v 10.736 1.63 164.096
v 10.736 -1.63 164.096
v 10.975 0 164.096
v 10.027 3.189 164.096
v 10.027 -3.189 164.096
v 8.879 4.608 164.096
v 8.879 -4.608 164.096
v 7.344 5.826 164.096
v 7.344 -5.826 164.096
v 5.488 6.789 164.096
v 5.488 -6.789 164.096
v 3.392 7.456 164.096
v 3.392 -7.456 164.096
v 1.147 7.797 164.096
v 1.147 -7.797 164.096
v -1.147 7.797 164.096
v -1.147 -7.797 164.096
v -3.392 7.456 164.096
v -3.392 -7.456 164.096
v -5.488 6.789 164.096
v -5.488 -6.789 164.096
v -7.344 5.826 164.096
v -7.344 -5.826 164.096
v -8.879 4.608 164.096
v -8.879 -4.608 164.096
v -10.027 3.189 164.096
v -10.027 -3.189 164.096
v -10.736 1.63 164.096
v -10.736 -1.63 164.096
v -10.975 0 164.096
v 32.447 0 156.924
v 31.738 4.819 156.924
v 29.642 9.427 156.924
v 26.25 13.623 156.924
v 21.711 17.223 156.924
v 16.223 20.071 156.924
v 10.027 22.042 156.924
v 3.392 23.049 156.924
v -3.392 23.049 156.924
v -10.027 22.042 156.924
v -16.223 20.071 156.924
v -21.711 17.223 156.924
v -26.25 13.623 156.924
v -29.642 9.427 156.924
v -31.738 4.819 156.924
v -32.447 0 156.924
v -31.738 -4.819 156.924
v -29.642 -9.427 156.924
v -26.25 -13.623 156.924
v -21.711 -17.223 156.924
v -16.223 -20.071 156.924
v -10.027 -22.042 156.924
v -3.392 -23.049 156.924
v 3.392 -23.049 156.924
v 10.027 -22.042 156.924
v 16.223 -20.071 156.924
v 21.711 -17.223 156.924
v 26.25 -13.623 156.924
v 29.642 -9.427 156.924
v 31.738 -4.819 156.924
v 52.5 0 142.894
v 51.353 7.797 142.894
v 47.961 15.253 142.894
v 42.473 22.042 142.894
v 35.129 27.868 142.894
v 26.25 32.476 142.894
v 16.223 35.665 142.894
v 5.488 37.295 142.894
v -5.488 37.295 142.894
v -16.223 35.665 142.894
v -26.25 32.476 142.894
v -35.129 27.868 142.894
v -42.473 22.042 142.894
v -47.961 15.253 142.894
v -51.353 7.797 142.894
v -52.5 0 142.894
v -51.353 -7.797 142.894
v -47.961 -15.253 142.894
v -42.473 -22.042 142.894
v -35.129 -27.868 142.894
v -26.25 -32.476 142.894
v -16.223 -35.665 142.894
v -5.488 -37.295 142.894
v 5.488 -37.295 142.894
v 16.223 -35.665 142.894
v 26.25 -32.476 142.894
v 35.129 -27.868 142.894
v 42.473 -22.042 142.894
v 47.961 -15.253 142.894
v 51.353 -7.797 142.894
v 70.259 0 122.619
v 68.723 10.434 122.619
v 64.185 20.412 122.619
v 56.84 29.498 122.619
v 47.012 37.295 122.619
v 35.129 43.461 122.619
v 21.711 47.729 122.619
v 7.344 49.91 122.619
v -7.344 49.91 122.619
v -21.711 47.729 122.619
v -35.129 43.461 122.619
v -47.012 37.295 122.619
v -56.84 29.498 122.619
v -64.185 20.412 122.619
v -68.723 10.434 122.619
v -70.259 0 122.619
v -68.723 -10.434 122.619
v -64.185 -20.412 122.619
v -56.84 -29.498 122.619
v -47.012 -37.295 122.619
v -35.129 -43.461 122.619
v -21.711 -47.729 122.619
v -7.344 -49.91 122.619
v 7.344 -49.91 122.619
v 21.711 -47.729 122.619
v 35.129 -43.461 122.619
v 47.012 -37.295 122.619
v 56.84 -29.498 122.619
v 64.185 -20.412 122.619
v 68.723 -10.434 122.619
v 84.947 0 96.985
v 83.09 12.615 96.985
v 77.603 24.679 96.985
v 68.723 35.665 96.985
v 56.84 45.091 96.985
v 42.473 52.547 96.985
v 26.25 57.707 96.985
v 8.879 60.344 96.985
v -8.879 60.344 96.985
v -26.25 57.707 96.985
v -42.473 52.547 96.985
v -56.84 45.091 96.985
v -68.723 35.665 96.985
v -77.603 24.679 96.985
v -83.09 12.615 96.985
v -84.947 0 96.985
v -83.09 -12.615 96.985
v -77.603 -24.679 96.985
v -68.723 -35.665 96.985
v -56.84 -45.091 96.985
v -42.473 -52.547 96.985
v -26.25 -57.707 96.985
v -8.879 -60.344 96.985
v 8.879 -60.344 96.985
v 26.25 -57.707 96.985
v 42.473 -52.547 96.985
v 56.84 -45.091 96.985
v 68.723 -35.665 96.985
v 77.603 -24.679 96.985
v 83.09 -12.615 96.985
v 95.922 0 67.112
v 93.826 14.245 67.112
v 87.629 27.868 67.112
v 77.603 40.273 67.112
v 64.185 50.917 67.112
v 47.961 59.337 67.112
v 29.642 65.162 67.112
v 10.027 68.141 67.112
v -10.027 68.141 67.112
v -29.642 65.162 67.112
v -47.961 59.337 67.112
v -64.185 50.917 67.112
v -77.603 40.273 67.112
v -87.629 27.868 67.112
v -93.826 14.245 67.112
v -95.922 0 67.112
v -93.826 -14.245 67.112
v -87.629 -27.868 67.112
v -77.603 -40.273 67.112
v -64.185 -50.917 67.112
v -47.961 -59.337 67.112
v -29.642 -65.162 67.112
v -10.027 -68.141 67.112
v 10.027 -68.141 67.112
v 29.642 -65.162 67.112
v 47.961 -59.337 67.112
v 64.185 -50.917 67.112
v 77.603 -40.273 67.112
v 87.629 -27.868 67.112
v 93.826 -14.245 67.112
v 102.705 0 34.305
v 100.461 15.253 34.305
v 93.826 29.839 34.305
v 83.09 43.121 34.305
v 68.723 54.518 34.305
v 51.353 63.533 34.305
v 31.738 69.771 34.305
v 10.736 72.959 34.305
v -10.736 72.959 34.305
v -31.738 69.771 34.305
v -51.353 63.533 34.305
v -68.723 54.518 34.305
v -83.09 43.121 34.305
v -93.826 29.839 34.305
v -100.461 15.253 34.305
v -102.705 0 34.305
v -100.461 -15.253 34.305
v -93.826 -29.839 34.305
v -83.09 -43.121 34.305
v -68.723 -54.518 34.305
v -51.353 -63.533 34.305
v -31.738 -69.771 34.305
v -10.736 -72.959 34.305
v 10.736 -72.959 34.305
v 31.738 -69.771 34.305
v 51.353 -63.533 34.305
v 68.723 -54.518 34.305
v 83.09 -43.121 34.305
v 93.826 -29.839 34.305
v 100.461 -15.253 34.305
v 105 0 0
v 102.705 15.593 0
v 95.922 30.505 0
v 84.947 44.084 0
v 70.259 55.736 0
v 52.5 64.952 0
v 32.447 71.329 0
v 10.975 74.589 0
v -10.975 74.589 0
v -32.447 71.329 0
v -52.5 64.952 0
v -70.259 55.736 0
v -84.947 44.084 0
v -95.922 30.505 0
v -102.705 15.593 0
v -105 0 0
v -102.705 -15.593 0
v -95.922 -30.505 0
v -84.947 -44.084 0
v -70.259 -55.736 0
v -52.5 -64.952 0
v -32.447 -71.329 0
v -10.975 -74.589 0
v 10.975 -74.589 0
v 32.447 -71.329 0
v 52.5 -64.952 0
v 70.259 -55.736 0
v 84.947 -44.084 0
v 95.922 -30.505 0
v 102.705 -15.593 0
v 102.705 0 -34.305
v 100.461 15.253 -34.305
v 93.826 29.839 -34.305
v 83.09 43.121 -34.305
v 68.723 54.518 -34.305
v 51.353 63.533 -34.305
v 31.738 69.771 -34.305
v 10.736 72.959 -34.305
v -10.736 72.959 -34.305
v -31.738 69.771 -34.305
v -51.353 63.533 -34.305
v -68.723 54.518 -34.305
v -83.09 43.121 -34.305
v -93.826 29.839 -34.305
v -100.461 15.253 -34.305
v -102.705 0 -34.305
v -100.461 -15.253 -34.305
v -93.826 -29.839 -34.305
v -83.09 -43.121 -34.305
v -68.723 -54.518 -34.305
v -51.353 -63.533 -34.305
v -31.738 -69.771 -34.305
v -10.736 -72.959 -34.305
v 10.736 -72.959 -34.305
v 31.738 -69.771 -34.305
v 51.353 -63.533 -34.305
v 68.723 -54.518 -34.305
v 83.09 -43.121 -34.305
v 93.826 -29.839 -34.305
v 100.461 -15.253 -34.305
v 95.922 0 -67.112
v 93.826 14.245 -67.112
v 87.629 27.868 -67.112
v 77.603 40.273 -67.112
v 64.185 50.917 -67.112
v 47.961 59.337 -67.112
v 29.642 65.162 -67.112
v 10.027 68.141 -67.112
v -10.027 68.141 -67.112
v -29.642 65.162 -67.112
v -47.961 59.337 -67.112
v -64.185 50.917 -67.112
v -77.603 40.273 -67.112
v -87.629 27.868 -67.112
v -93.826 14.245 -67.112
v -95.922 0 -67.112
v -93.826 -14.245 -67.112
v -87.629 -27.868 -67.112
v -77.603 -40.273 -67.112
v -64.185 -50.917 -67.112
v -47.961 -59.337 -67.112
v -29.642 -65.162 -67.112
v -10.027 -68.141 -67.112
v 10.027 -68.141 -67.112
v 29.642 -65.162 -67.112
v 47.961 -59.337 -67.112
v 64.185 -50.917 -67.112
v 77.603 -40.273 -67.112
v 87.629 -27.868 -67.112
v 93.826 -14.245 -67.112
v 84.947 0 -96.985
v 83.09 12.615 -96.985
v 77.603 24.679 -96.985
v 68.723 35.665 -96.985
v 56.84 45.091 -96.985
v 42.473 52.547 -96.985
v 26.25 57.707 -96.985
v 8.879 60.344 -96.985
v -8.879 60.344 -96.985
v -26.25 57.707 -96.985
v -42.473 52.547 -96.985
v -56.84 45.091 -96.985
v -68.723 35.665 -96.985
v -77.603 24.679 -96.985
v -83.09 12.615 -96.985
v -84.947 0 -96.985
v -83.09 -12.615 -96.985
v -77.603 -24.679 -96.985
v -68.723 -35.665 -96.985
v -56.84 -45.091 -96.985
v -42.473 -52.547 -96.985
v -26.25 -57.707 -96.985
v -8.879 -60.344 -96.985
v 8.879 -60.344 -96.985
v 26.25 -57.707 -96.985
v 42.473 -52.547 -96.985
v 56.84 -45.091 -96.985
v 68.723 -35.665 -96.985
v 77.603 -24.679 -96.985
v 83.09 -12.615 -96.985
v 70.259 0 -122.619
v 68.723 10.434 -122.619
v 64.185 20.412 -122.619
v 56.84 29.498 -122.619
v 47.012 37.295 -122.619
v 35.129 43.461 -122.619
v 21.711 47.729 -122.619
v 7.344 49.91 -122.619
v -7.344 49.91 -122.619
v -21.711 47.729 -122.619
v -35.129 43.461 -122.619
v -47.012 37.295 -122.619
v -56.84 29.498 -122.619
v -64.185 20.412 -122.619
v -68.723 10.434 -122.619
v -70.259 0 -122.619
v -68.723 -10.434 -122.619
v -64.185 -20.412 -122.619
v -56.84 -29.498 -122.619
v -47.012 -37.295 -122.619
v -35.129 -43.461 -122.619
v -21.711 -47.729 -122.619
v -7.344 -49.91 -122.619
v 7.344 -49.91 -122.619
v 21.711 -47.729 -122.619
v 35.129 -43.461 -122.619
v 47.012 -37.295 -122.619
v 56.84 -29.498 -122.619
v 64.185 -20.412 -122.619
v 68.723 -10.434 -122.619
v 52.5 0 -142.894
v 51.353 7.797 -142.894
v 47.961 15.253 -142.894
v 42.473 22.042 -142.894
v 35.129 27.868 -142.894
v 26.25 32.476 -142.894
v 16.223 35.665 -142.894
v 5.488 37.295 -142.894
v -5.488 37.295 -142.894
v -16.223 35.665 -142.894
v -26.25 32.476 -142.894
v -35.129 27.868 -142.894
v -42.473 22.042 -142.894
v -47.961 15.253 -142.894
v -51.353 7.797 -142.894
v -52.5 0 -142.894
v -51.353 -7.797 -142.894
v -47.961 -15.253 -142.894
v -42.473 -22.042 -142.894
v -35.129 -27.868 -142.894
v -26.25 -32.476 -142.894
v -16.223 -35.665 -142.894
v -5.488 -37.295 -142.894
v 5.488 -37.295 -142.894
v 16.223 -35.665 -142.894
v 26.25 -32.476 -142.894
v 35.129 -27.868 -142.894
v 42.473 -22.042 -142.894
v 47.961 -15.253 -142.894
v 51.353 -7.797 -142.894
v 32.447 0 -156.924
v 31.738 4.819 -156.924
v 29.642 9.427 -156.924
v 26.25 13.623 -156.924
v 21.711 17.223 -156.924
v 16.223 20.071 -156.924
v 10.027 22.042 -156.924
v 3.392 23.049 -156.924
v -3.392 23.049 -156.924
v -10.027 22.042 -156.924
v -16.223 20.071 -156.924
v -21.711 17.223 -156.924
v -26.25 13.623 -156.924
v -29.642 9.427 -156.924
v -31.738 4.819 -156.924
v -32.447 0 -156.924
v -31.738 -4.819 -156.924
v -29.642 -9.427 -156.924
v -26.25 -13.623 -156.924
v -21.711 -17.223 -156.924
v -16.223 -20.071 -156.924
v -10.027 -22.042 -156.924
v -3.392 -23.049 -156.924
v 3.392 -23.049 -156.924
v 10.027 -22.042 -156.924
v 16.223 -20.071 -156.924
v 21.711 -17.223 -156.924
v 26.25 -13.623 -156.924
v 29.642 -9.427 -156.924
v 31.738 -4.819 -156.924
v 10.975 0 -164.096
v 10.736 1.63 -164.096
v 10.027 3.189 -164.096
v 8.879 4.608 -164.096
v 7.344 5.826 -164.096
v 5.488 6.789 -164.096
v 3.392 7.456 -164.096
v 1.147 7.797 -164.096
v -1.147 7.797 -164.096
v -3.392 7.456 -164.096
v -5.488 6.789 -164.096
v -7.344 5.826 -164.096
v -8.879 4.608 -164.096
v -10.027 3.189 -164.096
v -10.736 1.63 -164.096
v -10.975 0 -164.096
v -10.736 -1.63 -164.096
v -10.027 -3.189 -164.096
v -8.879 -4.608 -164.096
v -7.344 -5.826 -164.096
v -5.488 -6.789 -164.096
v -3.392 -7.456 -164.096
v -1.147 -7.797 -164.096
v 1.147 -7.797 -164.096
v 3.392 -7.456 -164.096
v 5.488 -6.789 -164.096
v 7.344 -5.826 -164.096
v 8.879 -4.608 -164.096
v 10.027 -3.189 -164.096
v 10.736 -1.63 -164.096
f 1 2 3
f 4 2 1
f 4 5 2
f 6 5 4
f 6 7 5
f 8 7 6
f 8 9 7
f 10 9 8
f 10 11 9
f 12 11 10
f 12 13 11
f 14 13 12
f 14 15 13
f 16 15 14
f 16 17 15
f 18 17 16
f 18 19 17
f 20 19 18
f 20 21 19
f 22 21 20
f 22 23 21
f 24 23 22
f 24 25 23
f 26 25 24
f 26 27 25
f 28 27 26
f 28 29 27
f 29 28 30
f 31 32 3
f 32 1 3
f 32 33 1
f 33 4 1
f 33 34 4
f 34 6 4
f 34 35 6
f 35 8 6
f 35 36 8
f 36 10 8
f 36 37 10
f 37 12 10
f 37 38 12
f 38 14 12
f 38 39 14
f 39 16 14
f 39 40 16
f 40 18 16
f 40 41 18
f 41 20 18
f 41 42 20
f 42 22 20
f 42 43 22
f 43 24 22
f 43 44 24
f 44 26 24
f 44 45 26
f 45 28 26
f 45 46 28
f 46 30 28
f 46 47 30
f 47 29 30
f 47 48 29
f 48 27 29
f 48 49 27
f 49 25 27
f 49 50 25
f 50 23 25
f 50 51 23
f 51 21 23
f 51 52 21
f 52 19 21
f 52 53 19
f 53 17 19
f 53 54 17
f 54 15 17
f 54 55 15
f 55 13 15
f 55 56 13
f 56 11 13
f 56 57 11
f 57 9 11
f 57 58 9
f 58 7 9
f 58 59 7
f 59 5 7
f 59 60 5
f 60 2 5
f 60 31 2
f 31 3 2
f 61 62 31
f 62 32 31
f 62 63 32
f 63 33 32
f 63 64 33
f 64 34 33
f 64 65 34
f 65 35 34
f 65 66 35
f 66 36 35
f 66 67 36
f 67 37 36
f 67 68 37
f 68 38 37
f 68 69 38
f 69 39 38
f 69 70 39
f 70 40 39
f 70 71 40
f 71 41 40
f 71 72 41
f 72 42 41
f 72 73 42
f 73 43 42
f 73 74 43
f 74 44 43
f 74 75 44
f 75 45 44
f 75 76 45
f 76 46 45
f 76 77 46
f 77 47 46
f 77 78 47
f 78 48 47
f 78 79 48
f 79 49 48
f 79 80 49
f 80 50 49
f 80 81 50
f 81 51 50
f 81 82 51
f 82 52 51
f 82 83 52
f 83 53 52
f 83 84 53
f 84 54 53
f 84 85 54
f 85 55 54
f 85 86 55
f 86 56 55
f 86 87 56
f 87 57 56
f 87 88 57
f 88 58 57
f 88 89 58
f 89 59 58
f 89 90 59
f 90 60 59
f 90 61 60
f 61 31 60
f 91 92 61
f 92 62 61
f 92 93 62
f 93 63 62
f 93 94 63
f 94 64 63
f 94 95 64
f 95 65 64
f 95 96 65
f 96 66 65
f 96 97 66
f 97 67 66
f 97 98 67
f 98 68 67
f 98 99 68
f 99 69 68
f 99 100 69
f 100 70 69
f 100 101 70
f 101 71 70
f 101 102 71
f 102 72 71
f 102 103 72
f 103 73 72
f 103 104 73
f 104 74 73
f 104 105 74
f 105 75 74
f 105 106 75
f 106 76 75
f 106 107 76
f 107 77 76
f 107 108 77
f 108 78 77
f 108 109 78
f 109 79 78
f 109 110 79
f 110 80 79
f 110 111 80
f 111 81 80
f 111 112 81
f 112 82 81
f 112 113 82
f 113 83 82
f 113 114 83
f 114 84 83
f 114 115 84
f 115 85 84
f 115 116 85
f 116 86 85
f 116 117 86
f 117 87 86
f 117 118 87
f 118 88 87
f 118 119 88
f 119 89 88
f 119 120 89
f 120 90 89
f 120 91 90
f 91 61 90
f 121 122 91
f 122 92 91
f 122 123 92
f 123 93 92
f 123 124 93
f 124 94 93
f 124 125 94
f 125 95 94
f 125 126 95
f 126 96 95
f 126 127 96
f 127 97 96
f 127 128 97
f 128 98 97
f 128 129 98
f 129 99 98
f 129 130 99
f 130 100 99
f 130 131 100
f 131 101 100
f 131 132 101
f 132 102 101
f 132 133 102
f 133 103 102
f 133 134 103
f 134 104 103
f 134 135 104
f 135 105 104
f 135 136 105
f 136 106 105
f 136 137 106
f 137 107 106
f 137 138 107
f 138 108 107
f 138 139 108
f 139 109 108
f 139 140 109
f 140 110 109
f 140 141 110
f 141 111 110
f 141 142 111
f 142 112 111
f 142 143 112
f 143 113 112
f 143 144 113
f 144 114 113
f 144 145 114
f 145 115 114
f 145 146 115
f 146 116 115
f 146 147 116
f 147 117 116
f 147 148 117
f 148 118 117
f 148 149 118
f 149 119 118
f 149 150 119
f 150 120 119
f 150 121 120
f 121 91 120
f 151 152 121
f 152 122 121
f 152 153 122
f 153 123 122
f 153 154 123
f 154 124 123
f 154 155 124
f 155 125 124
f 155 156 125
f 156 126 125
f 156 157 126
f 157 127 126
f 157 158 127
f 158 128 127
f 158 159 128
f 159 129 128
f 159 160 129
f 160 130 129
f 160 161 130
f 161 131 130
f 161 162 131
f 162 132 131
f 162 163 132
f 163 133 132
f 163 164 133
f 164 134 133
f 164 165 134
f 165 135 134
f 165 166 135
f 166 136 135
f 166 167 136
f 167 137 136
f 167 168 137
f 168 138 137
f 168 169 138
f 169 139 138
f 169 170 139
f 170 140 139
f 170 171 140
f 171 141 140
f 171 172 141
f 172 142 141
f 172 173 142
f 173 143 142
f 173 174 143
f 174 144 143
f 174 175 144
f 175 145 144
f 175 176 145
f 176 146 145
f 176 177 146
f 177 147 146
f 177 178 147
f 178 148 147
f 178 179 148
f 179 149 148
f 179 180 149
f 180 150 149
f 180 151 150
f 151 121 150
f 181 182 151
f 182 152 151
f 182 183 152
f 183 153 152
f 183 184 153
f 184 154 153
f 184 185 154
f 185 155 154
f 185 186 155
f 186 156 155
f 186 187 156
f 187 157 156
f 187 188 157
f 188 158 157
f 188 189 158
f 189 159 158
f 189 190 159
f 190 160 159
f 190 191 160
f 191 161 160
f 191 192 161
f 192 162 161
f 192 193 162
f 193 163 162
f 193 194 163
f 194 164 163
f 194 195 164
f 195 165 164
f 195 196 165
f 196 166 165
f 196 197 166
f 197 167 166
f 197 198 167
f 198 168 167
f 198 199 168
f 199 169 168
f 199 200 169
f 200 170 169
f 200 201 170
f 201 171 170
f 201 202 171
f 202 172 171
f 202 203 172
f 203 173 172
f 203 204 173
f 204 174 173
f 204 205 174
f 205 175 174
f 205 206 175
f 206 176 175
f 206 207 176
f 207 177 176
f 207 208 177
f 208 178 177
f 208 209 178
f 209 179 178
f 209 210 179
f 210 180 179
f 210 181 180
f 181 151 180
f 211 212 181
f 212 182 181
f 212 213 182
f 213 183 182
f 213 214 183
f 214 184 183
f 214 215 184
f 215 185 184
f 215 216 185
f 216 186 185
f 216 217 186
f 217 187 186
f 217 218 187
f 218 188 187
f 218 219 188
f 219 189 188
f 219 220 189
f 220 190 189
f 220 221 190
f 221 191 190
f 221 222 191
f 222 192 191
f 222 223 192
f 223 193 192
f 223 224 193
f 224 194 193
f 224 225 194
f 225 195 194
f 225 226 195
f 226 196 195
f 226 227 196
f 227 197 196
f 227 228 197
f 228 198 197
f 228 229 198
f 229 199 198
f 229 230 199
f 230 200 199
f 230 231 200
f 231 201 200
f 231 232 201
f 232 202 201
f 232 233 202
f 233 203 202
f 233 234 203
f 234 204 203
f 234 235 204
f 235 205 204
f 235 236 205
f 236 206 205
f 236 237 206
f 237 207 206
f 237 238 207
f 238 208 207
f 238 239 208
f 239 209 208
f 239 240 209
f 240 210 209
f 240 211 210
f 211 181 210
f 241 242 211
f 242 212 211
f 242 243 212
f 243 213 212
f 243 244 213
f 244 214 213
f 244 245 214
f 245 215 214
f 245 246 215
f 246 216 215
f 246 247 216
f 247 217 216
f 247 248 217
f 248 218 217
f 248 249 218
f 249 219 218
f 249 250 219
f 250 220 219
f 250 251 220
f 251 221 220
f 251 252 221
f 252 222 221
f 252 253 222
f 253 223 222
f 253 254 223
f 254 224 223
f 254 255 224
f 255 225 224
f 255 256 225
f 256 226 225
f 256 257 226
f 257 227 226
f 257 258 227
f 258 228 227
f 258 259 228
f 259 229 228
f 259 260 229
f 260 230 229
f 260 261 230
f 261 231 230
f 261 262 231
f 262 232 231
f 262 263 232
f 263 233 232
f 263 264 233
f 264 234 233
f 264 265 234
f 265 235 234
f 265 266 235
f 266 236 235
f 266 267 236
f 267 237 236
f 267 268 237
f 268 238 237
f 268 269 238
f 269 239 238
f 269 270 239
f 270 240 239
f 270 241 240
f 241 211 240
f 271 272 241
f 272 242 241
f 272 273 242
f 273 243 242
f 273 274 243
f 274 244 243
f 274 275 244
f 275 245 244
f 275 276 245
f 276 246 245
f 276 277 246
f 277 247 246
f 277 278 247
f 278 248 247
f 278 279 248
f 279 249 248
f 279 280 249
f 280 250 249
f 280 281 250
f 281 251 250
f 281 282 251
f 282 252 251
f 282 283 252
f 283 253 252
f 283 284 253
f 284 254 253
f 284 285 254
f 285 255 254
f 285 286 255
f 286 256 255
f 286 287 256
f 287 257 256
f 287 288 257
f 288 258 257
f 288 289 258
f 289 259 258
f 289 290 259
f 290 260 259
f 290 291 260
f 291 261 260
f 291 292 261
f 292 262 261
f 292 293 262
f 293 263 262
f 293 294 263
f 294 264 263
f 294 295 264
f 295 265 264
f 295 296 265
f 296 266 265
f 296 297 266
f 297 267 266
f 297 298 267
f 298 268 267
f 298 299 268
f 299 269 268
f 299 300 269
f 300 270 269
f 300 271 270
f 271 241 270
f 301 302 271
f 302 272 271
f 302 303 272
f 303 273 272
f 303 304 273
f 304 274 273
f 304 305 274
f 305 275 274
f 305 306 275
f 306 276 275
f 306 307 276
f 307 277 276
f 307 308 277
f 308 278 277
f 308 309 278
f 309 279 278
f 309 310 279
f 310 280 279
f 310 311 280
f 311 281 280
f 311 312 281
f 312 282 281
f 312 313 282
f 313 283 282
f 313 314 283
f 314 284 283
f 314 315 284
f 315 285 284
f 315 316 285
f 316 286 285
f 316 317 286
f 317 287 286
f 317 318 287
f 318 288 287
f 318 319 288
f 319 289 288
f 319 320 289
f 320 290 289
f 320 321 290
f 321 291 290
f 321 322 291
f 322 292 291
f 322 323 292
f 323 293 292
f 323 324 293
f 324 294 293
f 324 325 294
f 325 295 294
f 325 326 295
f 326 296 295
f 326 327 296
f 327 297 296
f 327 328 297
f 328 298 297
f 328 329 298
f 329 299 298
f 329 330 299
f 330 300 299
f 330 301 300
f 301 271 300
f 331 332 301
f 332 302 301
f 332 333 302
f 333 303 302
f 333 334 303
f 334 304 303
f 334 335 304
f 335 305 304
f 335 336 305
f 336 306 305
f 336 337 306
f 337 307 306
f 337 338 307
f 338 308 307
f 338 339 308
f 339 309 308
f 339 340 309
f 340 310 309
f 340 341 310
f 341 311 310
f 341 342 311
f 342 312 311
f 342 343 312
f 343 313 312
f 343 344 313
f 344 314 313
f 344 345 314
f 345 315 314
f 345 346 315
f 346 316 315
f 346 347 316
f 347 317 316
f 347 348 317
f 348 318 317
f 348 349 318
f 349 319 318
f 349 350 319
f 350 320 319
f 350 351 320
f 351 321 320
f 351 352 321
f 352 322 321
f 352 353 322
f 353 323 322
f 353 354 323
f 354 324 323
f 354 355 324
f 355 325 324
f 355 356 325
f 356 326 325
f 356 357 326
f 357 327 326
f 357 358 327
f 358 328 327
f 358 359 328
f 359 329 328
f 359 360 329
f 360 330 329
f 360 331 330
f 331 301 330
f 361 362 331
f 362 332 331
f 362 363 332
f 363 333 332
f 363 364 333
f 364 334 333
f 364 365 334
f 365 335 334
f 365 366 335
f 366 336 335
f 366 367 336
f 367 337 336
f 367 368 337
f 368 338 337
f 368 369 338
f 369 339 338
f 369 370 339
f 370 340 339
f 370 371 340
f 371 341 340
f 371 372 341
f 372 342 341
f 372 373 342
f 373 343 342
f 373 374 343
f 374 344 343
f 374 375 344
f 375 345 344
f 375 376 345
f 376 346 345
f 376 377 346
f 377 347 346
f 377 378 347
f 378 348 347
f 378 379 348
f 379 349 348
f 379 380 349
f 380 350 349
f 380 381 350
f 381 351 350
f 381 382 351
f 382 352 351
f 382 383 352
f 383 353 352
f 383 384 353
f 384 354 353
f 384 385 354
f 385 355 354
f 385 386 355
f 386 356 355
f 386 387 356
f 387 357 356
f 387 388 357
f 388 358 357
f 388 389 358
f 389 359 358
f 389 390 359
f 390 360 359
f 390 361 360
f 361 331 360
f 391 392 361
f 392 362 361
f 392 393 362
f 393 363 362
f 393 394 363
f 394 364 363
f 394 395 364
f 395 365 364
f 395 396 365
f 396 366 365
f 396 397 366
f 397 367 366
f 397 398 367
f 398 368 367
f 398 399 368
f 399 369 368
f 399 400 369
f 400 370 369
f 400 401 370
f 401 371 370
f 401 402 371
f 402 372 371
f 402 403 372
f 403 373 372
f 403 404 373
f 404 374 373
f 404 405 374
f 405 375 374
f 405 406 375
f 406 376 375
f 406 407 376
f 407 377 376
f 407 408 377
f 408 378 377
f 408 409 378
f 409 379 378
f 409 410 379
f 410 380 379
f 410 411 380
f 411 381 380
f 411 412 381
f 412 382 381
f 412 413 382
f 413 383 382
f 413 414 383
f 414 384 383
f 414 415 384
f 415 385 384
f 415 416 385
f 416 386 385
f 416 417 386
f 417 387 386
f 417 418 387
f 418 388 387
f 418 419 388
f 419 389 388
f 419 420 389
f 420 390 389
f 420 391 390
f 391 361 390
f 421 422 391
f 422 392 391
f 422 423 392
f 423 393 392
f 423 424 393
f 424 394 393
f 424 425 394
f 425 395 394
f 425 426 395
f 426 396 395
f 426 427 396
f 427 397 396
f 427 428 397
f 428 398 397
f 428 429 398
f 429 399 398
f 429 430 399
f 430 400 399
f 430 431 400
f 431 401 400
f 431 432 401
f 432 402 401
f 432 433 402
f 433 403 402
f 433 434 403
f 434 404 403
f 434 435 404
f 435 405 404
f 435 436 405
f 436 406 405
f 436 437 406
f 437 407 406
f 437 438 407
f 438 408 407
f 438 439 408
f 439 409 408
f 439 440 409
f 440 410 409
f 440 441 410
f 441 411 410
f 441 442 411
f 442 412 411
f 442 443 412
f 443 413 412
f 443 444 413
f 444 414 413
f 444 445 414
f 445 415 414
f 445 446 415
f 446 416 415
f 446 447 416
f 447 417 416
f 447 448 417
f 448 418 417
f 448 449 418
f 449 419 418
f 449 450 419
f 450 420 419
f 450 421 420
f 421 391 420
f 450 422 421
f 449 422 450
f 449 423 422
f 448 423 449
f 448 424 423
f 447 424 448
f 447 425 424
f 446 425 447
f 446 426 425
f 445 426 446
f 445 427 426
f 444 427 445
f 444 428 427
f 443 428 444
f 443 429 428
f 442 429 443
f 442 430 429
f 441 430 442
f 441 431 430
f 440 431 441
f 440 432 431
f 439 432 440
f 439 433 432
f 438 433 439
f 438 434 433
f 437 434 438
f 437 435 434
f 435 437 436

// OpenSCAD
// Generated by SolidPython 1.0.1 on 2020-07-29 00:46:47


scale(v = [7, 5, 11]) {
	sphere(r = 15);
}
/***********************************************
*********      SolidPython code:      **********
************************************************
 
# import packages: SolidPython
from solid import *
from solid.utils import *
from itertools import chain, combinations, permutations


class Resize:

    def __init__(self, scad_file):
        self.scad_file = scad_file
        #self.scad_file = import_scad(scad_file)
        # cone/cylinder param:
        self.r1 = 0
        self.r2 = 0
        self.h = 0
        # rectangular prism param:
        self.w = 0
        self.l = 0
        # ellipse param:
        self.r = 0

    # import OpenScad code (file name corresponds to shape)


    # classify shape + parameters
    def assign(self, param1, param2, param3):
        if self.scad_file == 'cone.scad':
            self.r1 = param1
            self.r2 = param2
            self.h = param3
        elif self.scad_file == 'cylinder.scad':
            self.r1 = param1
            self.r2 = param2
            self.h = param3
        elif self.scad_file == 'rectangularPrism.scad':
            self.h = param1
            self.l = param2
            self.w = param3
        else:
            self.r = param1
            self.h = param2

    # resize parameters
    def iterate(self):
        x = range(3, 20, 2)
        i = 1
        if self.scad_file == 'cone.scad':
            tempList = list(permutations(x, 2))
            for temp in tempList:
                param1 = temp[0]
                param2 = temp[1]
                filepath = 'produced_scad_files/' + 'cone' + str(param1) + '_' + str(param2) + '_' + '.scad'
                scad_render_to_file(cylinder(h=param1, r1=param2, r2=0), filepath)

        elif self.scad_file == 'cylinder.scad':
            tempList = list(permutations(x, 3))
            for temp in tempList:
                param1 = temp[0]
                param2 = temp[1]
                filepath = 'produced_scad_files/' + 'cylinder' + str(param1) + '_' + str(param2) + '_' + '.scad'
                scad_render_to_file(cylinder(h=param1, r1=param2, r2=param2), filepath)

        elif self.scad_file == 'rectangularPrism.scad':
            tempList = list(permutations(x, 3))
            for temp in tempList:
                param1 = temp[0]
                param2 = temp[1]
                param3 = temp[2]
                filepath = 'produced_scad_files/' + 'rectangularPrism' + str(param1) + '_' + str(param2) + '_' + str(
                    param3) + '.scad'
                scad_render_to_file(cube(size=(param1, param2, param3)), filepath)

        elif self.scad_file == 'ellipse.scad':
            tempList = list(permutations(x, 4))
            for temp in tempList:
                param1 = temp[0]
                param2 = temp[1]
                param3 = temp[2]
                param4 = temp[3]
                filepath = 'produced_scad_files/' + 'ellipse' + str(param1) + '_' + str(param2) + '_' + str(param3) + '_' + str(param4) + '.scad'
                scad_render_to_file(scale([param1, param2, param3])(sphere(r=param4)), filepath)

    def render_to_scadfile(self):
        scad_render_to_file(scad, 'example.scad') 
 
************************************************/
